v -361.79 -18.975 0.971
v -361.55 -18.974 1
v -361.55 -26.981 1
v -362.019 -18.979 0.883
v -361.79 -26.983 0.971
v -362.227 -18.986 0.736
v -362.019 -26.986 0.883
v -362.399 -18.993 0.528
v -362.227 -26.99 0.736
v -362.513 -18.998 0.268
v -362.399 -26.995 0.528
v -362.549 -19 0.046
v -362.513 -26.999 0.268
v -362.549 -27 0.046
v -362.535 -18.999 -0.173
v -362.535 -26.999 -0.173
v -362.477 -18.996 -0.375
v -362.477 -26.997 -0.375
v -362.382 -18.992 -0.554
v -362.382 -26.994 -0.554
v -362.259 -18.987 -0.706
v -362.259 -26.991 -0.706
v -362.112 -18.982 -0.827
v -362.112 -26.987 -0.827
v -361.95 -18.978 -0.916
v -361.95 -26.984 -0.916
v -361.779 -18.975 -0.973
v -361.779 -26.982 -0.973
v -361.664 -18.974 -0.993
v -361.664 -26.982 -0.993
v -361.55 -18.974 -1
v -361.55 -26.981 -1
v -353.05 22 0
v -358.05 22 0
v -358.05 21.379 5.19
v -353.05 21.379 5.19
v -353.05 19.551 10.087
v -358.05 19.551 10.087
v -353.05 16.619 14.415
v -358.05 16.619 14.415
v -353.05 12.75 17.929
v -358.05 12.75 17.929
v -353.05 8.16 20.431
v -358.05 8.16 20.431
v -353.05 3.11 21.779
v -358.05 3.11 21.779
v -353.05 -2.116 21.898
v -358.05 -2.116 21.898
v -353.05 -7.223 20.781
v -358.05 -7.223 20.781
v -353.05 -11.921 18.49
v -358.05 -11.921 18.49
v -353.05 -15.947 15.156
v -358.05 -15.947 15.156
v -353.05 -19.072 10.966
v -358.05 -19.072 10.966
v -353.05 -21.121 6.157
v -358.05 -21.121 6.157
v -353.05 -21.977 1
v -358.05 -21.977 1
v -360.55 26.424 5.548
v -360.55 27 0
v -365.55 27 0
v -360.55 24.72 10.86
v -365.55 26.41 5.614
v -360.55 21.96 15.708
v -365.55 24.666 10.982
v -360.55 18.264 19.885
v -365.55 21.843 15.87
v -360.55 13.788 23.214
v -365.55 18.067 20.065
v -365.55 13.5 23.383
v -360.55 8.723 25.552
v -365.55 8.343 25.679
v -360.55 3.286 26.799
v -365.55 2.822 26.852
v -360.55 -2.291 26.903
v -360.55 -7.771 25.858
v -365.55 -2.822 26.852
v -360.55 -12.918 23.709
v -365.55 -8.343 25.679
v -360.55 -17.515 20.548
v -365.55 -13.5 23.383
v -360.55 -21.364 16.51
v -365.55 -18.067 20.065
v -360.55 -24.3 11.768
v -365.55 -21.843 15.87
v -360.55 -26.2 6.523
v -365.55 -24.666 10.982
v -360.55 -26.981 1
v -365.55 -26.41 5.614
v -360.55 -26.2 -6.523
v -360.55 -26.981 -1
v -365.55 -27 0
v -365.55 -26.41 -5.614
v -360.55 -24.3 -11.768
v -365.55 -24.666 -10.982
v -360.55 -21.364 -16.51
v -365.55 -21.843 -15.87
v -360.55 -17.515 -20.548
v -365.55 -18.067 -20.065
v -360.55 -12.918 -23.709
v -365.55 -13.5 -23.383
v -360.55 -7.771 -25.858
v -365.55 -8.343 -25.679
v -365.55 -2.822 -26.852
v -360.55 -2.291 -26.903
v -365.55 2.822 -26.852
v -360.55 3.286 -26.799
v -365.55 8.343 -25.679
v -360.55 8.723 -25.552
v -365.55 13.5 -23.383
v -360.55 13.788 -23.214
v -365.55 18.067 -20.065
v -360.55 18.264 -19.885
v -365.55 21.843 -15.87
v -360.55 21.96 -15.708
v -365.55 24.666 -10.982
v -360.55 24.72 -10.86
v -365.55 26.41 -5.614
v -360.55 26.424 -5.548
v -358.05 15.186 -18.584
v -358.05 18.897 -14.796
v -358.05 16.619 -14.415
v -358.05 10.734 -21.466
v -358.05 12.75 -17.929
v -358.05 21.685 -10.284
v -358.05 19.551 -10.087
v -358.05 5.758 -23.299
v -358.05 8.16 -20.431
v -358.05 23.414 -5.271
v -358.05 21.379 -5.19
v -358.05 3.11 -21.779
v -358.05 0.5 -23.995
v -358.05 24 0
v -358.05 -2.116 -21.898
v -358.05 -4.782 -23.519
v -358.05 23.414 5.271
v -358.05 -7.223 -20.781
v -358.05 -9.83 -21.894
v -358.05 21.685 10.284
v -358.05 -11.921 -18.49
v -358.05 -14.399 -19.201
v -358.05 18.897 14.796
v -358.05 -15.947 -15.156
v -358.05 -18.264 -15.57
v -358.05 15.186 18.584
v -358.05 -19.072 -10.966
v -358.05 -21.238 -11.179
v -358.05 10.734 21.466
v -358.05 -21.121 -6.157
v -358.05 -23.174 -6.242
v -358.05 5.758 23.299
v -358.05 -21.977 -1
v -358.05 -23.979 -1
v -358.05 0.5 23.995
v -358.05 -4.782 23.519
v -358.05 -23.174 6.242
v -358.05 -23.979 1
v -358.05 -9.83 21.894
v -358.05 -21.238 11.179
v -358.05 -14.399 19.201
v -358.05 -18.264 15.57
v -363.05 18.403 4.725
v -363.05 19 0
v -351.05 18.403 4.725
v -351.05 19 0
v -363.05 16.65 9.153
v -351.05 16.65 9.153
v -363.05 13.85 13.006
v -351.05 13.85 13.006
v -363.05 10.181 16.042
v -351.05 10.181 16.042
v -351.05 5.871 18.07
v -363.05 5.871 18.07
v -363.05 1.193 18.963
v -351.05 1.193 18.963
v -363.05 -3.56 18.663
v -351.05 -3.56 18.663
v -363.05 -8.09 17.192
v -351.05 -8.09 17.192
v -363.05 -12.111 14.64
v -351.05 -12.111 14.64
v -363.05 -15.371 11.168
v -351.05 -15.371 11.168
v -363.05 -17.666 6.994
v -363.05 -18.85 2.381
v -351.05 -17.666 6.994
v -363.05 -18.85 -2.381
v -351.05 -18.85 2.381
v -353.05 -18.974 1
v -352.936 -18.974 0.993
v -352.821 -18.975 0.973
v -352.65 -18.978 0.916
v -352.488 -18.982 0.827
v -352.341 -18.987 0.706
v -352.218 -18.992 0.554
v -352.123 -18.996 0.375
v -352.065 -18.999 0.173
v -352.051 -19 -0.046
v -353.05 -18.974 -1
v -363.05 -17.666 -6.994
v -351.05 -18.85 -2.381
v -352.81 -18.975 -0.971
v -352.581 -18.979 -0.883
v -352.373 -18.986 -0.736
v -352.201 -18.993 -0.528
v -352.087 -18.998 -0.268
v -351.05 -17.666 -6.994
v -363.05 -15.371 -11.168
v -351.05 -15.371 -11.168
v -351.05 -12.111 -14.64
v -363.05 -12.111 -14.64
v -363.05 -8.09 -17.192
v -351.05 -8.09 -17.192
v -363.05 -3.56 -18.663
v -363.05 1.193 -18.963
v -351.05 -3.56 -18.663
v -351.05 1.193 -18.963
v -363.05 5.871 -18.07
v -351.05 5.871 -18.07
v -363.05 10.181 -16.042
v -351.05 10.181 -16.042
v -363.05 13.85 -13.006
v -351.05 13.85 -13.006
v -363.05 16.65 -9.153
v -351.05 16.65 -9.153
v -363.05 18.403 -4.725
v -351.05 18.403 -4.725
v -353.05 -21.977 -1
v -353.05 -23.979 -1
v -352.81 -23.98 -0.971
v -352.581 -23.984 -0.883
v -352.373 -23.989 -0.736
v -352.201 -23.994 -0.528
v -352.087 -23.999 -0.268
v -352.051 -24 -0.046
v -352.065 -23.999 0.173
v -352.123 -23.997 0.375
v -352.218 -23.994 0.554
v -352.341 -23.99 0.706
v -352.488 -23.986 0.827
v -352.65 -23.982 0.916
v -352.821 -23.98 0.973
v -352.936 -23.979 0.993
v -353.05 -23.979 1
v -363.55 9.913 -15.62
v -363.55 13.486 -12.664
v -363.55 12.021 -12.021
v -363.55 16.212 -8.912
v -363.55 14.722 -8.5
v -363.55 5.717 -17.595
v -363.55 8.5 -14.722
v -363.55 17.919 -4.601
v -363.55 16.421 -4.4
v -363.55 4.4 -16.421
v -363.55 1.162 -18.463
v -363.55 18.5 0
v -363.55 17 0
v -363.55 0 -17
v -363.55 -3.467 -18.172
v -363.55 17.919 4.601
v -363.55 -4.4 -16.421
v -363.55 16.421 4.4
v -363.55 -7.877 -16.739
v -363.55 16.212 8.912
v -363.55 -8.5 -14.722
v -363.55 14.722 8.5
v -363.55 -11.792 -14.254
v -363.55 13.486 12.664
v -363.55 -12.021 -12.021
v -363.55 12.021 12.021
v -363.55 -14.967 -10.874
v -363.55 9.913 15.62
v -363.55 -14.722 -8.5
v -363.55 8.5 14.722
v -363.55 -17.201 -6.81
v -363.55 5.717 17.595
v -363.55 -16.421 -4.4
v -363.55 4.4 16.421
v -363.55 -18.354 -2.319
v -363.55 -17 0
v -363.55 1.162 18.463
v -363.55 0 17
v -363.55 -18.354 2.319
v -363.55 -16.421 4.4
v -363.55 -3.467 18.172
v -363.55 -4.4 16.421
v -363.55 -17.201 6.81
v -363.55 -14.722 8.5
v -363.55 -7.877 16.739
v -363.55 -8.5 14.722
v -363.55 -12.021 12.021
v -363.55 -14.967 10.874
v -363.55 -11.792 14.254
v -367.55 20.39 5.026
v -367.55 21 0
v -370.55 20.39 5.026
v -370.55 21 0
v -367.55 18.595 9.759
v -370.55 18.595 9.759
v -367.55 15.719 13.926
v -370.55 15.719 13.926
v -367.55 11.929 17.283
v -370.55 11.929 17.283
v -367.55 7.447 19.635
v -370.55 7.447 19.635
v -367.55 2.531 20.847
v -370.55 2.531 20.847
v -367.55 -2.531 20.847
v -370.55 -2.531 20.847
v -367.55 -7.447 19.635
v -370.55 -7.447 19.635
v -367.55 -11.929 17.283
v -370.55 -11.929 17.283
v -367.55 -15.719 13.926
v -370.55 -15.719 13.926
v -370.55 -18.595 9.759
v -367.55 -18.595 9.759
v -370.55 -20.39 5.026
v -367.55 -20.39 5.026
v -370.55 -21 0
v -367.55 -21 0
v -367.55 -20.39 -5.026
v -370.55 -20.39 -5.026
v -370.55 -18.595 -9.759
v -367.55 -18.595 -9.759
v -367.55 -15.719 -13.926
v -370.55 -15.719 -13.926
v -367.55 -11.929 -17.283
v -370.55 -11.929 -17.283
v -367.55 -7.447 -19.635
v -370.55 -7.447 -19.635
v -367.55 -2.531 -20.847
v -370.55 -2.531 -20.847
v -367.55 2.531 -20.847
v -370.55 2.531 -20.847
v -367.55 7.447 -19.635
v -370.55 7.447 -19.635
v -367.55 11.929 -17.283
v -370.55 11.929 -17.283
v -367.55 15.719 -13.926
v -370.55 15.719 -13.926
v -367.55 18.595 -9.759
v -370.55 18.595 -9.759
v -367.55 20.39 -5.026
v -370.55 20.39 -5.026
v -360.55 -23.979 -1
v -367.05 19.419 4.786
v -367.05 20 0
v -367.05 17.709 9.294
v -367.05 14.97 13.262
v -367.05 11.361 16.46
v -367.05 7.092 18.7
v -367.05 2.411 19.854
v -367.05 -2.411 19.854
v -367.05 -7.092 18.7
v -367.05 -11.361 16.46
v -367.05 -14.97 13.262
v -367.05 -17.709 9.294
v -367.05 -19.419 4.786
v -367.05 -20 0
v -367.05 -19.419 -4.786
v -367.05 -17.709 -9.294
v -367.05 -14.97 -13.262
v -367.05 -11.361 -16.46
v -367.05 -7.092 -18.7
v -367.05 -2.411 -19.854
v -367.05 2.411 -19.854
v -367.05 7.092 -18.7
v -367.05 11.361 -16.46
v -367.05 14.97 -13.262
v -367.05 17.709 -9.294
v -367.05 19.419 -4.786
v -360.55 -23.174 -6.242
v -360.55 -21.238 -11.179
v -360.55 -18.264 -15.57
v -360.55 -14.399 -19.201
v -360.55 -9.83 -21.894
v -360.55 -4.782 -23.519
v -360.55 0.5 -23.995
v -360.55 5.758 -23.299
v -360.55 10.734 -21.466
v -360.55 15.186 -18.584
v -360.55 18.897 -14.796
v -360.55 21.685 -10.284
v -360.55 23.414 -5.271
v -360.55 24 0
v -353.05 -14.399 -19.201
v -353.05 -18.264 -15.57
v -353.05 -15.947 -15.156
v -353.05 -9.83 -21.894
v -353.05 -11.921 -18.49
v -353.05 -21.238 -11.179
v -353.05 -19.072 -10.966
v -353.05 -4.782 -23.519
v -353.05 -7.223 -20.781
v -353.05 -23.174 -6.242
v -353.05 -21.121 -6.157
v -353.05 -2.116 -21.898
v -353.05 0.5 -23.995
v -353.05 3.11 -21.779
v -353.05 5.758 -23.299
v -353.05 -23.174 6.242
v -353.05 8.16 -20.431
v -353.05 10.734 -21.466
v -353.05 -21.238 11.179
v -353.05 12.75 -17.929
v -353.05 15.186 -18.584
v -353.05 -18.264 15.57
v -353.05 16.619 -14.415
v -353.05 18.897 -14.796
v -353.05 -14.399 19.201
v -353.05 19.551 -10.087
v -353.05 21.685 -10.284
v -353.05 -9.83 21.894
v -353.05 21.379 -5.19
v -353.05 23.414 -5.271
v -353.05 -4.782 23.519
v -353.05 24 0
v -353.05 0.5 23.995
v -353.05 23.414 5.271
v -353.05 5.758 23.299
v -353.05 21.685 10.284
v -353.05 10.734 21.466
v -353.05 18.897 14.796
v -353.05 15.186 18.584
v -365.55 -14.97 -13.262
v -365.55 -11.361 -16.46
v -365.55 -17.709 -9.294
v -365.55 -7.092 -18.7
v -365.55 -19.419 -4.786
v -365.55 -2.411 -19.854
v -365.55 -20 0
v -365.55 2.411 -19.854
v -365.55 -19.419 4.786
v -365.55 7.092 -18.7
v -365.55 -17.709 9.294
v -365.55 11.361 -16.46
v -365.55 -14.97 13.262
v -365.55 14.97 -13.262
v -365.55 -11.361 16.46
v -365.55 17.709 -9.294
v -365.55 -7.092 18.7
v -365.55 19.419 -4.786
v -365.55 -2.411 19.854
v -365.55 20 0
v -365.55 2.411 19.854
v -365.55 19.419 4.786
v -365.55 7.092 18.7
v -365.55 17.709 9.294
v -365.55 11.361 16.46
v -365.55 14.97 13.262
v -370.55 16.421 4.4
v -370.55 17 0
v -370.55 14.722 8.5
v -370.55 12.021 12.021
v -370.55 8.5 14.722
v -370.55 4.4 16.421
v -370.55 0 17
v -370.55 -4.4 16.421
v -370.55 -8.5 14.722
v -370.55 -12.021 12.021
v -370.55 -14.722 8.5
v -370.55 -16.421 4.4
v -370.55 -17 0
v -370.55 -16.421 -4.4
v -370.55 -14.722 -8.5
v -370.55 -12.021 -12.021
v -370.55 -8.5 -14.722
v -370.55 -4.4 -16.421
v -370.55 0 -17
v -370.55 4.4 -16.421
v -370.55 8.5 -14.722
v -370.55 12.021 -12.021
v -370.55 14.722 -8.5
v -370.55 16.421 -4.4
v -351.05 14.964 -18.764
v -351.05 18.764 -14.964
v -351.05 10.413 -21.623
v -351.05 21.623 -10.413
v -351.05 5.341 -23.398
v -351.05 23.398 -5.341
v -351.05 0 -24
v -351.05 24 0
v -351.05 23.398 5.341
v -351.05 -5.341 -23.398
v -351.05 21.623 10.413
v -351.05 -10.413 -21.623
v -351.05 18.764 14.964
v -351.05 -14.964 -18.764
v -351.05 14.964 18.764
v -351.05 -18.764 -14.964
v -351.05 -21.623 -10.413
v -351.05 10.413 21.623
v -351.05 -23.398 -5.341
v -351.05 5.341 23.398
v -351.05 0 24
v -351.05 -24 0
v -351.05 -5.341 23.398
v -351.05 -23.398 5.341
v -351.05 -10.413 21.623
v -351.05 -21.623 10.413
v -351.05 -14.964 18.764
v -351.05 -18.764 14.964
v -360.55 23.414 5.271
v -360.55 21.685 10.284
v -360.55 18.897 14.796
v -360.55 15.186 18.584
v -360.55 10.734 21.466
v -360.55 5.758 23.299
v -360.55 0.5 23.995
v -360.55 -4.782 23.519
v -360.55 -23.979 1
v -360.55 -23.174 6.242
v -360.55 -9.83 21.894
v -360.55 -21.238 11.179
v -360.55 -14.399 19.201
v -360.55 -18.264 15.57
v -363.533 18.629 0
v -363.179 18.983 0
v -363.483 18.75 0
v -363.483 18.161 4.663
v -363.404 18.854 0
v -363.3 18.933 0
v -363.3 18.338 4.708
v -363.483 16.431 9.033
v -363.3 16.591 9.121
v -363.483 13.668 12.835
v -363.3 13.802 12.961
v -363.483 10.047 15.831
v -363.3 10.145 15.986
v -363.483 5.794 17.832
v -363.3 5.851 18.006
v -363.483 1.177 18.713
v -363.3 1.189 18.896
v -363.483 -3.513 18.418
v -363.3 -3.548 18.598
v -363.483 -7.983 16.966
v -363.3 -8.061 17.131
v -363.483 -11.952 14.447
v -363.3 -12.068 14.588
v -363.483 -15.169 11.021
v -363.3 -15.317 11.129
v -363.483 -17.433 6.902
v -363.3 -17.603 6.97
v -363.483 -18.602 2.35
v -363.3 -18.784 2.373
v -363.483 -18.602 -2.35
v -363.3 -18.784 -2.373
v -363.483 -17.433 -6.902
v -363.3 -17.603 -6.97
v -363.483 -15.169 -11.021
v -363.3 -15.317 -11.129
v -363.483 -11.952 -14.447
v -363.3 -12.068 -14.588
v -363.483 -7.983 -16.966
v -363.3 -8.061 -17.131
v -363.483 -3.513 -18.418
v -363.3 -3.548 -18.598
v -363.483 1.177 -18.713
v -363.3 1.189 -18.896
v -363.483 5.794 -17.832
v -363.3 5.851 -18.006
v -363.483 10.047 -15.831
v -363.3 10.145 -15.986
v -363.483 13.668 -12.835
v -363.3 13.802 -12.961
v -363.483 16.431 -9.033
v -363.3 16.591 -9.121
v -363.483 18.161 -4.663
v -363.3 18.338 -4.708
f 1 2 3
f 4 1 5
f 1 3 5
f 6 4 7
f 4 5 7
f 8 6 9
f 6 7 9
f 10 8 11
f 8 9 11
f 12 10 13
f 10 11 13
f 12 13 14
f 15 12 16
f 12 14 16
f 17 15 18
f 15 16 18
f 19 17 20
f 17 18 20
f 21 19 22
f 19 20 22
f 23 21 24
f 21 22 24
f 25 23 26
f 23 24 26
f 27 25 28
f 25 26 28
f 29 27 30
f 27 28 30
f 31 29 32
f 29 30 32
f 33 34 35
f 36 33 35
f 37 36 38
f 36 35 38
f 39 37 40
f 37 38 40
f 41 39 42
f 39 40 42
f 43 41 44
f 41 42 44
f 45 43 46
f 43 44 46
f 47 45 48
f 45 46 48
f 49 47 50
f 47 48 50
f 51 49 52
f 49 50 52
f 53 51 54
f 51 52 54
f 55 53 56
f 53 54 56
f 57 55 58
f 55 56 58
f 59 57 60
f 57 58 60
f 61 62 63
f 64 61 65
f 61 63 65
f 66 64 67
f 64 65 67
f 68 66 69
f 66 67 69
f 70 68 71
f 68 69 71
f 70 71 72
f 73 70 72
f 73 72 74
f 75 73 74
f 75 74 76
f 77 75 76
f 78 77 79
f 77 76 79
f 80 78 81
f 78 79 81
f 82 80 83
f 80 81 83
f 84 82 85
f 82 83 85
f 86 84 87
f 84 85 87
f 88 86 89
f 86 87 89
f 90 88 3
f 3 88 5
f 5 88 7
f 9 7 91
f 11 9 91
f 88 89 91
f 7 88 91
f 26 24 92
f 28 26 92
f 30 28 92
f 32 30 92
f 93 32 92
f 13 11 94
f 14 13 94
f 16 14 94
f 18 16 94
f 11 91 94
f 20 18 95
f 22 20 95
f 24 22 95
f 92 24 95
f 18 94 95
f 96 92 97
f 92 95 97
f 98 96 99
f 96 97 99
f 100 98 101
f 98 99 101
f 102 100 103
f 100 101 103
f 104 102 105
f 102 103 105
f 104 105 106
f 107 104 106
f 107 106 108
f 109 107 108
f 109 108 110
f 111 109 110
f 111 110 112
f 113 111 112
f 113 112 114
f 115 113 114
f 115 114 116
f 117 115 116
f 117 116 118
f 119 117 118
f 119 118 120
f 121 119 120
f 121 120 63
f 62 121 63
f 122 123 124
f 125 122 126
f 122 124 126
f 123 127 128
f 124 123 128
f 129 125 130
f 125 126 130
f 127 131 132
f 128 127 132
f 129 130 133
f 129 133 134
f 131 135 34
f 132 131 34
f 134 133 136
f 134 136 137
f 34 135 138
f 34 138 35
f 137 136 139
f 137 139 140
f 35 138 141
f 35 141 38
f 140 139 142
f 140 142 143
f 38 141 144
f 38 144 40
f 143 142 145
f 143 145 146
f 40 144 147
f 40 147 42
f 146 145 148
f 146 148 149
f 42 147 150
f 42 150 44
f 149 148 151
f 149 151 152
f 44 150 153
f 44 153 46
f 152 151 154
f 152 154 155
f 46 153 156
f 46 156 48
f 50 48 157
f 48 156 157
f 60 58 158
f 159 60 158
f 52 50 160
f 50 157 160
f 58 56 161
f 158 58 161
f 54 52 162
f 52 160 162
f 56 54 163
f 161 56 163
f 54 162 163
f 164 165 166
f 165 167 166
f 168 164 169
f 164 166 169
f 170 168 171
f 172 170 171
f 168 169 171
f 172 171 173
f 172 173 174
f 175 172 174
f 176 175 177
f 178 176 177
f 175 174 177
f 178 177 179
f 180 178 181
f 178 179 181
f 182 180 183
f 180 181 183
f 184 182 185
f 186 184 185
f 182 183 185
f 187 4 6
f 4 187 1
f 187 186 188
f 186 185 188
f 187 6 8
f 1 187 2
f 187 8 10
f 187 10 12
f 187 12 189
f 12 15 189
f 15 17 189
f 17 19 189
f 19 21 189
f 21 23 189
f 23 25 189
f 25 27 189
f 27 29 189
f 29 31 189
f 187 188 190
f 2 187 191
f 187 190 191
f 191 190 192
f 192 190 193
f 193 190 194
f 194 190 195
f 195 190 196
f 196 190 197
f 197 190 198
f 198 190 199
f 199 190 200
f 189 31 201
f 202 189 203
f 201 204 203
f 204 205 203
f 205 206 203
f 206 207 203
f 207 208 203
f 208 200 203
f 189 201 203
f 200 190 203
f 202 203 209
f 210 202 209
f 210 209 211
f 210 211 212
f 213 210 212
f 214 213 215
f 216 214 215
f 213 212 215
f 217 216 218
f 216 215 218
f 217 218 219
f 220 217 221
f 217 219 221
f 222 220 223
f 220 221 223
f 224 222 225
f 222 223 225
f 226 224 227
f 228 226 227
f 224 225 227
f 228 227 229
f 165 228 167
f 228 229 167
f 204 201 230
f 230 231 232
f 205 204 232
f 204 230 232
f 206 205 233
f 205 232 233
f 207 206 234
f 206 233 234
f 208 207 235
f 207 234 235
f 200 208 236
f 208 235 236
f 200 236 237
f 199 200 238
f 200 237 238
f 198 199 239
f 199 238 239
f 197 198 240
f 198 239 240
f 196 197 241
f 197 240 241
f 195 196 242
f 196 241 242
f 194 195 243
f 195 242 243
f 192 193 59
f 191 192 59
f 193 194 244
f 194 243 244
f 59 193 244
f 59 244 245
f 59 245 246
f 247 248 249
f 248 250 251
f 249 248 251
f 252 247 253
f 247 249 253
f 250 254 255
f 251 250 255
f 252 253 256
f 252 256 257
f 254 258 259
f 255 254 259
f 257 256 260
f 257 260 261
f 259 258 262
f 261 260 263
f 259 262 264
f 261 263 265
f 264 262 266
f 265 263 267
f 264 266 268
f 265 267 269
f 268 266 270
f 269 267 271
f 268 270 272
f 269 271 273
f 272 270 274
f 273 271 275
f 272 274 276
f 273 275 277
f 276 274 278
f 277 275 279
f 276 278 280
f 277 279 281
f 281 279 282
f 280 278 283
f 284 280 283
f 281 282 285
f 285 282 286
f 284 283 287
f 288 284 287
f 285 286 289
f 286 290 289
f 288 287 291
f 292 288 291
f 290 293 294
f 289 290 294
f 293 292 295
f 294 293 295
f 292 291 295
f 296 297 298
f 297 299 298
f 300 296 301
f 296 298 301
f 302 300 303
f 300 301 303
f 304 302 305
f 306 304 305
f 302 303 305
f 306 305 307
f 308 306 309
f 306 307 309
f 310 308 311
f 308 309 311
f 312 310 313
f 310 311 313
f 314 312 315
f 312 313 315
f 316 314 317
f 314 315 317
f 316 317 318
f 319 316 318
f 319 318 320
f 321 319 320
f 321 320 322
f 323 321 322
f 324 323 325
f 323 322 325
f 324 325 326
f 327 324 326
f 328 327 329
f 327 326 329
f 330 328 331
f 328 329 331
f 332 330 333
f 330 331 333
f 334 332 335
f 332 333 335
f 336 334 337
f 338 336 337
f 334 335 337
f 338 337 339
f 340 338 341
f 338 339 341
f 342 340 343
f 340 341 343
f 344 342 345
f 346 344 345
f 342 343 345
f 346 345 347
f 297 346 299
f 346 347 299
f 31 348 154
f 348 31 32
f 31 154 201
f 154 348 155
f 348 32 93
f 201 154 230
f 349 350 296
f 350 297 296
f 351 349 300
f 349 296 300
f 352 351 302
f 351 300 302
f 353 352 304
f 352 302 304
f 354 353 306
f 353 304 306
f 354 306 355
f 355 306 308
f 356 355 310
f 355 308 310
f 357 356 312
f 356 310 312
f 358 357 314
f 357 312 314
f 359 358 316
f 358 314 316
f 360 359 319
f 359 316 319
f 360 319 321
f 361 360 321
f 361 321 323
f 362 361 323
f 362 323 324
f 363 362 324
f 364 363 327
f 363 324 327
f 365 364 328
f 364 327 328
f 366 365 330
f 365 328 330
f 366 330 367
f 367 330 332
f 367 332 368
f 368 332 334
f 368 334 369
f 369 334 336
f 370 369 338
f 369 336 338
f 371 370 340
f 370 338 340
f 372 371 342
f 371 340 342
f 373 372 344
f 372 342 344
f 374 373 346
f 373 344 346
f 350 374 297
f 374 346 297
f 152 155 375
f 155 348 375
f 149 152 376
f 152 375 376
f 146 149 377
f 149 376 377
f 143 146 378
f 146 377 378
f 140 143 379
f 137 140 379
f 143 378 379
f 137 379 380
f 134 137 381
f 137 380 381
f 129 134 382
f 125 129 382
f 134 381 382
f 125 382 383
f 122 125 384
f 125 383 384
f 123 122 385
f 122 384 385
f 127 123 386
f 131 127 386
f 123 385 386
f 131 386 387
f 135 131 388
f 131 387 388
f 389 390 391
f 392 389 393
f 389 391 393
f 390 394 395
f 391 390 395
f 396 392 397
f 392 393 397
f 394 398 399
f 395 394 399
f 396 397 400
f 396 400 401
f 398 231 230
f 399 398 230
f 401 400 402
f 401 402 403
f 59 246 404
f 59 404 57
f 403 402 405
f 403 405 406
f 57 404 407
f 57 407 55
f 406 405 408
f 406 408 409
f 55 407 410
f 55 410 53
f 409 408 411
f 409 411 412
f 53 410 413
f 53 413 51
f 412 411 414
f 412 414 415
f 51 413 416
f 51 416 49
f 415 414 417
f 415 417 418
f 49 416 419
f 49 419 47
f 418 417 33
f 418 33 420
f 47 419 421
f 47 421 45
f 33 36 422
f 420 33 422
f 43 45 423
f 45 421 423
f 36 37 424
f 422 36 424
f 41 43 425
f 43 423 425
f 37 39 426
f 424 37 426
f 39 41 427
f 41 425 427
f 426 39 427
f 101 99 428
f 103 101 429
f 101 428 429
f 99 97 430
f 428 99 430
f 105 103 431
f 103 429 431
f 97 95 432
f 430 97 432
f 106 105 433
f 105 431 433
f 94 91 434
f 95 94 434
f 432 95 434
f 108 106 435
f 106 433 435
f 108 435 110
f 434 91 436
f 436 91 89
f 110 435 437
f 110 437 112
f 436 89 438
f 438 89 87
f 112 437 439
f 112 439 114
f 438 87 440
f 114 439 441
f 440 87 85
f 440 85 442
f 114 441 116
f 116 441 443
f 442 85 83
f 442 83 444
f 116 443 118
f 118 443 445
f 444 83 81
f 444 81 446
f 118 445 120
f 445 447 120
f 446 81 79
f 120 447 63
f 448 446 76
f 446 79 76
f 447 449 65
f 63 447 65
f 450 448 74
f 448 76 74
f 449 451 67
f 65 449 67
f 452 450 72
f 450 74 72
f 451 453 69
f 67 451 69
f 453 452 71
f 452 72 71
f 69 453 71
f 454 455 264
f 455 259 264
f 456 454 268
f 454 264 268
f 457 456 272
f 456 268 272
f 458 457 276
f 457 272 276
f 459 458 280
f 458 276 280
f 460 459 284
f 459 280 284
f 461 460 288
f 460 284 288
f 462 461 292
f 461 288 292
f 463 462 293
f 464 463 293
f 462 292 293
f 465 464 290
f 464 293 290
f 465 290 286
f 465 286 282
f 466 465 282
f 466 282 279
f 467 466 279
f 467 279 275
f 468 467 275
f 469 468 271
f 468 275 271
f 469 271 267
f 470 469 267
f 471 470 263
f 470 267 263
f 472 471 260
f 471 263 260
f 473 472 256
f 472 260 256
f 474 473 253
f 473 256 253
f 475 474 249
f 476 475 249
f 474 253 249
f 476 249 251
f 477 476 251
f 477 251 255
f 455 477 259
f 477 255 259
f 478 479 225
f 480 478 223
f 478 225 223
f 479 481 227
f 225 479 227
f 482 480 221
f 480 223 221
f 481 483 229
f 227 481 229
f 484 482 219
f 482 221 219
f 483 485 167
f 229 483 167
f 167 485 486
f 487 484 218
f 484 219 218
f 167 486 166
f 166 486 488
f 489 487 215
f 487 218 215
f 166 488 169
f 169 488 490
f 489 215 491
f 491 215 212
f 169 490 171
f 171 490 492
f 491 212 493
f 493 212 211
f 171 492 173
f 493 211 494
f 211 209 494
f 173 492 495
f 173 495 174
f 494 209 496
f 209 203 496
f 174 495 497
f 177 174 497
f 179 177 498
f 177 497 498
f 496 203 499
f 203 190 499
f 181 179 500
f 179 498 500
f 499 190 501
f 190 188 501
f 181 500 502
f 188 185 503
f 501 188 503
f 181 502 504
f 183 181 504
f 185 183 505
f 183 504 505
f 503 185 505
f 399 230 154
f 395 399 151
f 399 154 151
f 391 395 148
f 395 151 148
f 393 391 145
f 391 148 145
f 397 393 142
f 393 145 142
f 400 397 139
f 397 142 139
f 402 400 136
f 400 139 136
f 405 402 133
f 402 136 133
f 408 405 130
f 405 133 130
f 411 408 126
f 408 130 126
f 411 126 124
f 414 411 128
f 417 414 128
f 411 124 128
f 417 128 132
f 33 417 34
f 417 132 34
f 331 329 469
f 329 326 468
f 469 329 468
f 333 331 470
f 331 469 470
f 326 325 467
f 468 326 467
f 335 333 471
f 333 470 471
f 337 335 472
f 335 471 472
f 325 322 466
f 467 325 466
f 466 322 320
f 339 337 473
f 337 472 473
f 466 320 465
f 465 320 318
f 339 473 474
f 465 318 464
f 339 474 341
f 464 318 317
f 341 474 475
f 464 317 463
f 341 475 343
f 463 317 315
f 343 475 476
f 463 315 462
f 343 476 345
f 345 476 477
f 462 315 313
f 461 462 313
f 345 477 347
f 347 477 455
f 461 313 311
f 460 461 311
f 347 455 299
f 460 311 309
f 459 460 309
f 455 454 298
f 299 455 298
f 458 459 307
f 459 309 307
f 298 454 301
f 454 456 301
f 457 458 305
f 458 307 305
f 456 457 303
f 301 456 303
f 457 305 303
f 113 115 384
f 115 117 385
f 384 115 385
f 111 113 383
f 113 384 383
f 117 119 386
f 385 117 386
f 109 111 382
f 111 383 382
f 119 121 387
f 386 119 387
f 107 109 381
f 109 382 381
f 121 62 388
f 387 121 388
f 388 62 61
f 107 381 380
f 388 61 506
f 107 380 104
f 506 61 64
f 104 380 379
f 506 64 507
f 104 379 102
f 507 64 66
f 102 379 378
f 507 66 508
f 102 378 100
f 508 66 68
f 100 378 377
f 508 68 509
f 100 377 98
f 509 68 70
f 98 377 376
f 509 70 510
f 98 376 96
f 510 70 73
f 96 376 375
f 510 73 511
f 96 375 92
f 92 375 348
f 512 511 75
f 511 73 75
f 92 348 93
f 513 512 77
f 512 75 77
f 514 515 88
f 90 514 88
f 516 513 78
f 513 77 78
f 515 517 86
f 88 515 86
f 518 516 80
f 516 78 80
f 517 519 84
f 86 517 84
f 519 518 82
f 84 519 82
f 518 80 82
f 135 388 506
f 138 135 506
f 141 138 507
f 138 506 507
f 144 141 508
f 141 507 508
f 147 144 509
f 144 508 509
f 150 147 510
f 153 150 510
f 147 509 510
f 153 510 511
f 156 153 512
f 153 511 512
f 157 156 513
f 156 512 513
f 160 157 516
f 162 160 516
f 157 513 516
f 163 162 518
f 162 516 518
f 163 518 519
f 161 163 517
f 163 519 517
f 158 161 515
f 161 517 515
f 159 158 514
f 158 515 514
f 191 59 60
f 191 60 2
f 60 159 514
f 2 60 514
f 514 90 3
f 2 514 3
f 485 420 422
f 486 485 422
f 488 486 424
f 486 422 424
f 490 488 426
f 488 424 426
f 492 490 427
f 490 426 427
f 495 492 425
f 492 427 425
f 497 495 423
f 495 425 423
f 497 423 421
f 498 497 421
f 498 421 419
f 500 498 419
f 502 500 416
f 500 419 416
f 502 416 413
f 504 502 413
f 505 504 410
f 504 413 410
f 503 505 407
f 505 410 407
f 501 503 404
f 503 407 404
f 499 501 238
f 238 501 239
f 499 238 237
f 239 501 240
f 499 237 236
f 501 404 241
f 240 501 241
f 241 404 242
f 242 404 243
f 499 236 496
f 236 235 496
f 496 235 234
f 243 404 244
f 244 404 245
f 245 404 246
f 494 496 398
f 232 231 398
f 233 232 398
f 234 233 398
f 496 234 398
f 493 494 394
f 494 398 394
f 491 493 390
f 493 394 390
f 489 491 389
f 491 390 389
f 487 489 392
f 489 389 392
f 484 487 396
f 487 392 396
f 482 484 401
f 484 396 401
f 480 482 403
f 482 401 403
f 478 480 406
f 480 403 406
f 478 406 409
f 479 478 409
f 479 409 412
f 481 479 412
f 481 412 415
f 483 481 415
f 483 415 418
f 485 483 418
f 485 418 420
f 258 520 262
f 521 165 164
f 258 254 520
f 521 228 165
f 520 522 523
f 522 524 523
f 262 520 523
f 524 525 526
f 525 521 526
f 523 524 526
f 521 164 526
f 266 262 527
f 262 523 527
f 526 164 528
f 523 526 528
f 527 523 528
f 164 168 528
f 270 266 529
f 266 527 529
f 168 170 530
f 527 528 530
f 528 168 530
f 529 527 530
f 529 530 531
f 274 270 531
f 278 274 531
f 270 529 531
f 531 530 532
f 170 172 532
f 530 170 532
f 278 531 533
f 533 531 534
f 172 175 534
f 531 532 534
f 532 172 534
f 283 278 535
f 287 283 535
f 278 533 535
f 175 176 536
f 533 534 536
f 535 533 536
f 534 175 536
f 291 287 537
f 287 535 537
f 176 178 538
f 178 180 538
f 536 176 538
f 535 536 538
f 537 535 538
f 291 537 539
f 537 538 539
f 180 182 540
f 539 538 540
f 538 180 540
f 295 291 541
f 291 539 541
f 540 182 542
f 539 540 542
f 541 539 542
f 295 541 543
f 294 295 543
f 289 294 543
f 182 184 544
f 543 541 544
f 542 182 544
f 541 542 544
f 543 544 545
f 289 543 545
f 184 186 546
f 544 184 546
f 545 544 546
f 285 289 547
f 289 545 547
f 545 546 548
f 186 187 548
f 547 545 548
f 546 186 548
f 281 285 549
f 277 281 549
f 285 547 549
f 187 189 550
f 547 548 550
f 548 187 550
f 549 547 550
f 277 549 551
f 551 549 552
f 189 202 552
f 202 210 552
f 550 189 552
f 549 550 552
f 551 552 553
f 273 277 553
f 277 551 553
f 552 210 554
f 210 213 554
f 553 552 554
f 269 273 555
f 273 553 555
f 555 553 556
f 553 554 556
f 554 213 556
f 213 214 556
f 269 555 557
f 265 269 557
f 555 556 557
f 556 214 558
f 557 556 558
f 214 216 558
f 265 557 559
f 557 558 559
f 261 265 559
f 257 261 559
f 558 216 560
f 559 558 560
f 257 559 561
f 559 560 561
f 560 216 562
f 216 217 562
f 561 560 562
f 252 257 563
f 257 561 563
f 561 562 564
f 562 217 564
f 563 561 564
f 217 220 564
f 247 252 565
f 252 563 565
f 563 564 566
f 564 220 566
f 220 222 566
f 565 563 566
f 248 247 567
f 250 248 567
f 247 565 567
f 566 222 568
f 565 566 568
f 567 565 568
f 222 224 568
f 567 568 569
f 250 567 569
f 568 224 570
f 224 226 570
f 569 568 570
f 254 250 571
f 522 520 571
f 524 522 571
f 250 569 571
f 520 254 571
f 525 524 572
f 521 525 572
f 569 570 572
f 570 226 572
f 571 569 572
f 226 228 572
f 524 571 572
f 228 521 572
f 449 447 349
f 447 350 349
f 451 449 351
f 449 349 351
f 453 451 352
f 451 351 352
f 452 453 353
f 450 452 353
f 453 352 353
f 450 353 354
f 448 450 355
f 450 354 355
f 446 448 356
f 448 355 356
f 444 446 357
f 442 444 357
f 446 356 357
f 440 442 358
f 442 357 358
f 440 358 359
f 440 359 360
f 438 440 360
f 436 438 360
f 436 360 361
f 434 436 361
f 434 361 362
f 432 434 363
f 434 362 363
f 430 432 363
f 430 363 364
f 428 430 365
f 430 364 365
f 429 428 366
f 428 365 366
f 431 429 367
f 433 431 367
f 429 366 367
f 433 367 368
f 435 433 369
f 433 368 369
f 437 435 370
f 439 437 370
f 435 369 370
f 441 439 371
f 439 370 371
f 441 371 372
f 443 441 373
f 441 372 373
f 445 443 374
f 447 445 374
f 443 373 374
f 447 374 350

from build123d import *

# Parameters (mm, degrees)
ZAOBLIT1_R               = 0.5
ODEBRAT_START            = -8
ODEBRAT_VYSUNUT_M2_DEPTH = 8.026334


with BuildPart() as part:
    # Skica1 → Rotovat1 (revolve)
    with BuildSketch(Plane.XY):
        Polygon((-351.05, 24), (-353.05, 24), (-353.05, 22), (-358.05, 22), (-358.05, 24), (-360.55, 24), (-360.55, 27), (-365.55, 27), (-365.55, 20), (-367.05, 20), (-367.55, 21), (-370.55, 21), (-370.55, 19), (-370.55, 17), (-363.55, 17), (-363.55, 19), (-351.05, 19), align=None)
    revolve(axis=Axis((-379.936676629, 0, 0), (1, 0, 0)))

    # Zaoblit1
    zaoblit1_edges = [part.edges().sort_by_distance(p)[0] for p in [
        (-363.55, -19, 0),
    ]]
    fillet(zaoblit1_edges, radius=ZAOBLIT1_R)

    # Skica3 → Odebrat vysunutím2 (cut)
    with BuildSketch(Plane(origin=(0, -19, 0), x_dir=(1, 0, 0), z_dir=(0, 1, 0)).offset(ODEBRAT_START)):
        with BuildLine():
            Line((-353.05, -1), (-361.55, -1))
            ThreePointArc((-361.55, -1), (-362.55, 0), (-361.55, 1))
            Line((-361.55, 1), (-353.05, 1))
            ThreePointArc((-353.05, 1), (-352.05, 0), (-353.05, -1))
        make_face()
    extrude(amount=ODEBRAT_VYSUNUT_M2_DEPTH, mode=Mode.SUBTRACT)


solid = part.part
